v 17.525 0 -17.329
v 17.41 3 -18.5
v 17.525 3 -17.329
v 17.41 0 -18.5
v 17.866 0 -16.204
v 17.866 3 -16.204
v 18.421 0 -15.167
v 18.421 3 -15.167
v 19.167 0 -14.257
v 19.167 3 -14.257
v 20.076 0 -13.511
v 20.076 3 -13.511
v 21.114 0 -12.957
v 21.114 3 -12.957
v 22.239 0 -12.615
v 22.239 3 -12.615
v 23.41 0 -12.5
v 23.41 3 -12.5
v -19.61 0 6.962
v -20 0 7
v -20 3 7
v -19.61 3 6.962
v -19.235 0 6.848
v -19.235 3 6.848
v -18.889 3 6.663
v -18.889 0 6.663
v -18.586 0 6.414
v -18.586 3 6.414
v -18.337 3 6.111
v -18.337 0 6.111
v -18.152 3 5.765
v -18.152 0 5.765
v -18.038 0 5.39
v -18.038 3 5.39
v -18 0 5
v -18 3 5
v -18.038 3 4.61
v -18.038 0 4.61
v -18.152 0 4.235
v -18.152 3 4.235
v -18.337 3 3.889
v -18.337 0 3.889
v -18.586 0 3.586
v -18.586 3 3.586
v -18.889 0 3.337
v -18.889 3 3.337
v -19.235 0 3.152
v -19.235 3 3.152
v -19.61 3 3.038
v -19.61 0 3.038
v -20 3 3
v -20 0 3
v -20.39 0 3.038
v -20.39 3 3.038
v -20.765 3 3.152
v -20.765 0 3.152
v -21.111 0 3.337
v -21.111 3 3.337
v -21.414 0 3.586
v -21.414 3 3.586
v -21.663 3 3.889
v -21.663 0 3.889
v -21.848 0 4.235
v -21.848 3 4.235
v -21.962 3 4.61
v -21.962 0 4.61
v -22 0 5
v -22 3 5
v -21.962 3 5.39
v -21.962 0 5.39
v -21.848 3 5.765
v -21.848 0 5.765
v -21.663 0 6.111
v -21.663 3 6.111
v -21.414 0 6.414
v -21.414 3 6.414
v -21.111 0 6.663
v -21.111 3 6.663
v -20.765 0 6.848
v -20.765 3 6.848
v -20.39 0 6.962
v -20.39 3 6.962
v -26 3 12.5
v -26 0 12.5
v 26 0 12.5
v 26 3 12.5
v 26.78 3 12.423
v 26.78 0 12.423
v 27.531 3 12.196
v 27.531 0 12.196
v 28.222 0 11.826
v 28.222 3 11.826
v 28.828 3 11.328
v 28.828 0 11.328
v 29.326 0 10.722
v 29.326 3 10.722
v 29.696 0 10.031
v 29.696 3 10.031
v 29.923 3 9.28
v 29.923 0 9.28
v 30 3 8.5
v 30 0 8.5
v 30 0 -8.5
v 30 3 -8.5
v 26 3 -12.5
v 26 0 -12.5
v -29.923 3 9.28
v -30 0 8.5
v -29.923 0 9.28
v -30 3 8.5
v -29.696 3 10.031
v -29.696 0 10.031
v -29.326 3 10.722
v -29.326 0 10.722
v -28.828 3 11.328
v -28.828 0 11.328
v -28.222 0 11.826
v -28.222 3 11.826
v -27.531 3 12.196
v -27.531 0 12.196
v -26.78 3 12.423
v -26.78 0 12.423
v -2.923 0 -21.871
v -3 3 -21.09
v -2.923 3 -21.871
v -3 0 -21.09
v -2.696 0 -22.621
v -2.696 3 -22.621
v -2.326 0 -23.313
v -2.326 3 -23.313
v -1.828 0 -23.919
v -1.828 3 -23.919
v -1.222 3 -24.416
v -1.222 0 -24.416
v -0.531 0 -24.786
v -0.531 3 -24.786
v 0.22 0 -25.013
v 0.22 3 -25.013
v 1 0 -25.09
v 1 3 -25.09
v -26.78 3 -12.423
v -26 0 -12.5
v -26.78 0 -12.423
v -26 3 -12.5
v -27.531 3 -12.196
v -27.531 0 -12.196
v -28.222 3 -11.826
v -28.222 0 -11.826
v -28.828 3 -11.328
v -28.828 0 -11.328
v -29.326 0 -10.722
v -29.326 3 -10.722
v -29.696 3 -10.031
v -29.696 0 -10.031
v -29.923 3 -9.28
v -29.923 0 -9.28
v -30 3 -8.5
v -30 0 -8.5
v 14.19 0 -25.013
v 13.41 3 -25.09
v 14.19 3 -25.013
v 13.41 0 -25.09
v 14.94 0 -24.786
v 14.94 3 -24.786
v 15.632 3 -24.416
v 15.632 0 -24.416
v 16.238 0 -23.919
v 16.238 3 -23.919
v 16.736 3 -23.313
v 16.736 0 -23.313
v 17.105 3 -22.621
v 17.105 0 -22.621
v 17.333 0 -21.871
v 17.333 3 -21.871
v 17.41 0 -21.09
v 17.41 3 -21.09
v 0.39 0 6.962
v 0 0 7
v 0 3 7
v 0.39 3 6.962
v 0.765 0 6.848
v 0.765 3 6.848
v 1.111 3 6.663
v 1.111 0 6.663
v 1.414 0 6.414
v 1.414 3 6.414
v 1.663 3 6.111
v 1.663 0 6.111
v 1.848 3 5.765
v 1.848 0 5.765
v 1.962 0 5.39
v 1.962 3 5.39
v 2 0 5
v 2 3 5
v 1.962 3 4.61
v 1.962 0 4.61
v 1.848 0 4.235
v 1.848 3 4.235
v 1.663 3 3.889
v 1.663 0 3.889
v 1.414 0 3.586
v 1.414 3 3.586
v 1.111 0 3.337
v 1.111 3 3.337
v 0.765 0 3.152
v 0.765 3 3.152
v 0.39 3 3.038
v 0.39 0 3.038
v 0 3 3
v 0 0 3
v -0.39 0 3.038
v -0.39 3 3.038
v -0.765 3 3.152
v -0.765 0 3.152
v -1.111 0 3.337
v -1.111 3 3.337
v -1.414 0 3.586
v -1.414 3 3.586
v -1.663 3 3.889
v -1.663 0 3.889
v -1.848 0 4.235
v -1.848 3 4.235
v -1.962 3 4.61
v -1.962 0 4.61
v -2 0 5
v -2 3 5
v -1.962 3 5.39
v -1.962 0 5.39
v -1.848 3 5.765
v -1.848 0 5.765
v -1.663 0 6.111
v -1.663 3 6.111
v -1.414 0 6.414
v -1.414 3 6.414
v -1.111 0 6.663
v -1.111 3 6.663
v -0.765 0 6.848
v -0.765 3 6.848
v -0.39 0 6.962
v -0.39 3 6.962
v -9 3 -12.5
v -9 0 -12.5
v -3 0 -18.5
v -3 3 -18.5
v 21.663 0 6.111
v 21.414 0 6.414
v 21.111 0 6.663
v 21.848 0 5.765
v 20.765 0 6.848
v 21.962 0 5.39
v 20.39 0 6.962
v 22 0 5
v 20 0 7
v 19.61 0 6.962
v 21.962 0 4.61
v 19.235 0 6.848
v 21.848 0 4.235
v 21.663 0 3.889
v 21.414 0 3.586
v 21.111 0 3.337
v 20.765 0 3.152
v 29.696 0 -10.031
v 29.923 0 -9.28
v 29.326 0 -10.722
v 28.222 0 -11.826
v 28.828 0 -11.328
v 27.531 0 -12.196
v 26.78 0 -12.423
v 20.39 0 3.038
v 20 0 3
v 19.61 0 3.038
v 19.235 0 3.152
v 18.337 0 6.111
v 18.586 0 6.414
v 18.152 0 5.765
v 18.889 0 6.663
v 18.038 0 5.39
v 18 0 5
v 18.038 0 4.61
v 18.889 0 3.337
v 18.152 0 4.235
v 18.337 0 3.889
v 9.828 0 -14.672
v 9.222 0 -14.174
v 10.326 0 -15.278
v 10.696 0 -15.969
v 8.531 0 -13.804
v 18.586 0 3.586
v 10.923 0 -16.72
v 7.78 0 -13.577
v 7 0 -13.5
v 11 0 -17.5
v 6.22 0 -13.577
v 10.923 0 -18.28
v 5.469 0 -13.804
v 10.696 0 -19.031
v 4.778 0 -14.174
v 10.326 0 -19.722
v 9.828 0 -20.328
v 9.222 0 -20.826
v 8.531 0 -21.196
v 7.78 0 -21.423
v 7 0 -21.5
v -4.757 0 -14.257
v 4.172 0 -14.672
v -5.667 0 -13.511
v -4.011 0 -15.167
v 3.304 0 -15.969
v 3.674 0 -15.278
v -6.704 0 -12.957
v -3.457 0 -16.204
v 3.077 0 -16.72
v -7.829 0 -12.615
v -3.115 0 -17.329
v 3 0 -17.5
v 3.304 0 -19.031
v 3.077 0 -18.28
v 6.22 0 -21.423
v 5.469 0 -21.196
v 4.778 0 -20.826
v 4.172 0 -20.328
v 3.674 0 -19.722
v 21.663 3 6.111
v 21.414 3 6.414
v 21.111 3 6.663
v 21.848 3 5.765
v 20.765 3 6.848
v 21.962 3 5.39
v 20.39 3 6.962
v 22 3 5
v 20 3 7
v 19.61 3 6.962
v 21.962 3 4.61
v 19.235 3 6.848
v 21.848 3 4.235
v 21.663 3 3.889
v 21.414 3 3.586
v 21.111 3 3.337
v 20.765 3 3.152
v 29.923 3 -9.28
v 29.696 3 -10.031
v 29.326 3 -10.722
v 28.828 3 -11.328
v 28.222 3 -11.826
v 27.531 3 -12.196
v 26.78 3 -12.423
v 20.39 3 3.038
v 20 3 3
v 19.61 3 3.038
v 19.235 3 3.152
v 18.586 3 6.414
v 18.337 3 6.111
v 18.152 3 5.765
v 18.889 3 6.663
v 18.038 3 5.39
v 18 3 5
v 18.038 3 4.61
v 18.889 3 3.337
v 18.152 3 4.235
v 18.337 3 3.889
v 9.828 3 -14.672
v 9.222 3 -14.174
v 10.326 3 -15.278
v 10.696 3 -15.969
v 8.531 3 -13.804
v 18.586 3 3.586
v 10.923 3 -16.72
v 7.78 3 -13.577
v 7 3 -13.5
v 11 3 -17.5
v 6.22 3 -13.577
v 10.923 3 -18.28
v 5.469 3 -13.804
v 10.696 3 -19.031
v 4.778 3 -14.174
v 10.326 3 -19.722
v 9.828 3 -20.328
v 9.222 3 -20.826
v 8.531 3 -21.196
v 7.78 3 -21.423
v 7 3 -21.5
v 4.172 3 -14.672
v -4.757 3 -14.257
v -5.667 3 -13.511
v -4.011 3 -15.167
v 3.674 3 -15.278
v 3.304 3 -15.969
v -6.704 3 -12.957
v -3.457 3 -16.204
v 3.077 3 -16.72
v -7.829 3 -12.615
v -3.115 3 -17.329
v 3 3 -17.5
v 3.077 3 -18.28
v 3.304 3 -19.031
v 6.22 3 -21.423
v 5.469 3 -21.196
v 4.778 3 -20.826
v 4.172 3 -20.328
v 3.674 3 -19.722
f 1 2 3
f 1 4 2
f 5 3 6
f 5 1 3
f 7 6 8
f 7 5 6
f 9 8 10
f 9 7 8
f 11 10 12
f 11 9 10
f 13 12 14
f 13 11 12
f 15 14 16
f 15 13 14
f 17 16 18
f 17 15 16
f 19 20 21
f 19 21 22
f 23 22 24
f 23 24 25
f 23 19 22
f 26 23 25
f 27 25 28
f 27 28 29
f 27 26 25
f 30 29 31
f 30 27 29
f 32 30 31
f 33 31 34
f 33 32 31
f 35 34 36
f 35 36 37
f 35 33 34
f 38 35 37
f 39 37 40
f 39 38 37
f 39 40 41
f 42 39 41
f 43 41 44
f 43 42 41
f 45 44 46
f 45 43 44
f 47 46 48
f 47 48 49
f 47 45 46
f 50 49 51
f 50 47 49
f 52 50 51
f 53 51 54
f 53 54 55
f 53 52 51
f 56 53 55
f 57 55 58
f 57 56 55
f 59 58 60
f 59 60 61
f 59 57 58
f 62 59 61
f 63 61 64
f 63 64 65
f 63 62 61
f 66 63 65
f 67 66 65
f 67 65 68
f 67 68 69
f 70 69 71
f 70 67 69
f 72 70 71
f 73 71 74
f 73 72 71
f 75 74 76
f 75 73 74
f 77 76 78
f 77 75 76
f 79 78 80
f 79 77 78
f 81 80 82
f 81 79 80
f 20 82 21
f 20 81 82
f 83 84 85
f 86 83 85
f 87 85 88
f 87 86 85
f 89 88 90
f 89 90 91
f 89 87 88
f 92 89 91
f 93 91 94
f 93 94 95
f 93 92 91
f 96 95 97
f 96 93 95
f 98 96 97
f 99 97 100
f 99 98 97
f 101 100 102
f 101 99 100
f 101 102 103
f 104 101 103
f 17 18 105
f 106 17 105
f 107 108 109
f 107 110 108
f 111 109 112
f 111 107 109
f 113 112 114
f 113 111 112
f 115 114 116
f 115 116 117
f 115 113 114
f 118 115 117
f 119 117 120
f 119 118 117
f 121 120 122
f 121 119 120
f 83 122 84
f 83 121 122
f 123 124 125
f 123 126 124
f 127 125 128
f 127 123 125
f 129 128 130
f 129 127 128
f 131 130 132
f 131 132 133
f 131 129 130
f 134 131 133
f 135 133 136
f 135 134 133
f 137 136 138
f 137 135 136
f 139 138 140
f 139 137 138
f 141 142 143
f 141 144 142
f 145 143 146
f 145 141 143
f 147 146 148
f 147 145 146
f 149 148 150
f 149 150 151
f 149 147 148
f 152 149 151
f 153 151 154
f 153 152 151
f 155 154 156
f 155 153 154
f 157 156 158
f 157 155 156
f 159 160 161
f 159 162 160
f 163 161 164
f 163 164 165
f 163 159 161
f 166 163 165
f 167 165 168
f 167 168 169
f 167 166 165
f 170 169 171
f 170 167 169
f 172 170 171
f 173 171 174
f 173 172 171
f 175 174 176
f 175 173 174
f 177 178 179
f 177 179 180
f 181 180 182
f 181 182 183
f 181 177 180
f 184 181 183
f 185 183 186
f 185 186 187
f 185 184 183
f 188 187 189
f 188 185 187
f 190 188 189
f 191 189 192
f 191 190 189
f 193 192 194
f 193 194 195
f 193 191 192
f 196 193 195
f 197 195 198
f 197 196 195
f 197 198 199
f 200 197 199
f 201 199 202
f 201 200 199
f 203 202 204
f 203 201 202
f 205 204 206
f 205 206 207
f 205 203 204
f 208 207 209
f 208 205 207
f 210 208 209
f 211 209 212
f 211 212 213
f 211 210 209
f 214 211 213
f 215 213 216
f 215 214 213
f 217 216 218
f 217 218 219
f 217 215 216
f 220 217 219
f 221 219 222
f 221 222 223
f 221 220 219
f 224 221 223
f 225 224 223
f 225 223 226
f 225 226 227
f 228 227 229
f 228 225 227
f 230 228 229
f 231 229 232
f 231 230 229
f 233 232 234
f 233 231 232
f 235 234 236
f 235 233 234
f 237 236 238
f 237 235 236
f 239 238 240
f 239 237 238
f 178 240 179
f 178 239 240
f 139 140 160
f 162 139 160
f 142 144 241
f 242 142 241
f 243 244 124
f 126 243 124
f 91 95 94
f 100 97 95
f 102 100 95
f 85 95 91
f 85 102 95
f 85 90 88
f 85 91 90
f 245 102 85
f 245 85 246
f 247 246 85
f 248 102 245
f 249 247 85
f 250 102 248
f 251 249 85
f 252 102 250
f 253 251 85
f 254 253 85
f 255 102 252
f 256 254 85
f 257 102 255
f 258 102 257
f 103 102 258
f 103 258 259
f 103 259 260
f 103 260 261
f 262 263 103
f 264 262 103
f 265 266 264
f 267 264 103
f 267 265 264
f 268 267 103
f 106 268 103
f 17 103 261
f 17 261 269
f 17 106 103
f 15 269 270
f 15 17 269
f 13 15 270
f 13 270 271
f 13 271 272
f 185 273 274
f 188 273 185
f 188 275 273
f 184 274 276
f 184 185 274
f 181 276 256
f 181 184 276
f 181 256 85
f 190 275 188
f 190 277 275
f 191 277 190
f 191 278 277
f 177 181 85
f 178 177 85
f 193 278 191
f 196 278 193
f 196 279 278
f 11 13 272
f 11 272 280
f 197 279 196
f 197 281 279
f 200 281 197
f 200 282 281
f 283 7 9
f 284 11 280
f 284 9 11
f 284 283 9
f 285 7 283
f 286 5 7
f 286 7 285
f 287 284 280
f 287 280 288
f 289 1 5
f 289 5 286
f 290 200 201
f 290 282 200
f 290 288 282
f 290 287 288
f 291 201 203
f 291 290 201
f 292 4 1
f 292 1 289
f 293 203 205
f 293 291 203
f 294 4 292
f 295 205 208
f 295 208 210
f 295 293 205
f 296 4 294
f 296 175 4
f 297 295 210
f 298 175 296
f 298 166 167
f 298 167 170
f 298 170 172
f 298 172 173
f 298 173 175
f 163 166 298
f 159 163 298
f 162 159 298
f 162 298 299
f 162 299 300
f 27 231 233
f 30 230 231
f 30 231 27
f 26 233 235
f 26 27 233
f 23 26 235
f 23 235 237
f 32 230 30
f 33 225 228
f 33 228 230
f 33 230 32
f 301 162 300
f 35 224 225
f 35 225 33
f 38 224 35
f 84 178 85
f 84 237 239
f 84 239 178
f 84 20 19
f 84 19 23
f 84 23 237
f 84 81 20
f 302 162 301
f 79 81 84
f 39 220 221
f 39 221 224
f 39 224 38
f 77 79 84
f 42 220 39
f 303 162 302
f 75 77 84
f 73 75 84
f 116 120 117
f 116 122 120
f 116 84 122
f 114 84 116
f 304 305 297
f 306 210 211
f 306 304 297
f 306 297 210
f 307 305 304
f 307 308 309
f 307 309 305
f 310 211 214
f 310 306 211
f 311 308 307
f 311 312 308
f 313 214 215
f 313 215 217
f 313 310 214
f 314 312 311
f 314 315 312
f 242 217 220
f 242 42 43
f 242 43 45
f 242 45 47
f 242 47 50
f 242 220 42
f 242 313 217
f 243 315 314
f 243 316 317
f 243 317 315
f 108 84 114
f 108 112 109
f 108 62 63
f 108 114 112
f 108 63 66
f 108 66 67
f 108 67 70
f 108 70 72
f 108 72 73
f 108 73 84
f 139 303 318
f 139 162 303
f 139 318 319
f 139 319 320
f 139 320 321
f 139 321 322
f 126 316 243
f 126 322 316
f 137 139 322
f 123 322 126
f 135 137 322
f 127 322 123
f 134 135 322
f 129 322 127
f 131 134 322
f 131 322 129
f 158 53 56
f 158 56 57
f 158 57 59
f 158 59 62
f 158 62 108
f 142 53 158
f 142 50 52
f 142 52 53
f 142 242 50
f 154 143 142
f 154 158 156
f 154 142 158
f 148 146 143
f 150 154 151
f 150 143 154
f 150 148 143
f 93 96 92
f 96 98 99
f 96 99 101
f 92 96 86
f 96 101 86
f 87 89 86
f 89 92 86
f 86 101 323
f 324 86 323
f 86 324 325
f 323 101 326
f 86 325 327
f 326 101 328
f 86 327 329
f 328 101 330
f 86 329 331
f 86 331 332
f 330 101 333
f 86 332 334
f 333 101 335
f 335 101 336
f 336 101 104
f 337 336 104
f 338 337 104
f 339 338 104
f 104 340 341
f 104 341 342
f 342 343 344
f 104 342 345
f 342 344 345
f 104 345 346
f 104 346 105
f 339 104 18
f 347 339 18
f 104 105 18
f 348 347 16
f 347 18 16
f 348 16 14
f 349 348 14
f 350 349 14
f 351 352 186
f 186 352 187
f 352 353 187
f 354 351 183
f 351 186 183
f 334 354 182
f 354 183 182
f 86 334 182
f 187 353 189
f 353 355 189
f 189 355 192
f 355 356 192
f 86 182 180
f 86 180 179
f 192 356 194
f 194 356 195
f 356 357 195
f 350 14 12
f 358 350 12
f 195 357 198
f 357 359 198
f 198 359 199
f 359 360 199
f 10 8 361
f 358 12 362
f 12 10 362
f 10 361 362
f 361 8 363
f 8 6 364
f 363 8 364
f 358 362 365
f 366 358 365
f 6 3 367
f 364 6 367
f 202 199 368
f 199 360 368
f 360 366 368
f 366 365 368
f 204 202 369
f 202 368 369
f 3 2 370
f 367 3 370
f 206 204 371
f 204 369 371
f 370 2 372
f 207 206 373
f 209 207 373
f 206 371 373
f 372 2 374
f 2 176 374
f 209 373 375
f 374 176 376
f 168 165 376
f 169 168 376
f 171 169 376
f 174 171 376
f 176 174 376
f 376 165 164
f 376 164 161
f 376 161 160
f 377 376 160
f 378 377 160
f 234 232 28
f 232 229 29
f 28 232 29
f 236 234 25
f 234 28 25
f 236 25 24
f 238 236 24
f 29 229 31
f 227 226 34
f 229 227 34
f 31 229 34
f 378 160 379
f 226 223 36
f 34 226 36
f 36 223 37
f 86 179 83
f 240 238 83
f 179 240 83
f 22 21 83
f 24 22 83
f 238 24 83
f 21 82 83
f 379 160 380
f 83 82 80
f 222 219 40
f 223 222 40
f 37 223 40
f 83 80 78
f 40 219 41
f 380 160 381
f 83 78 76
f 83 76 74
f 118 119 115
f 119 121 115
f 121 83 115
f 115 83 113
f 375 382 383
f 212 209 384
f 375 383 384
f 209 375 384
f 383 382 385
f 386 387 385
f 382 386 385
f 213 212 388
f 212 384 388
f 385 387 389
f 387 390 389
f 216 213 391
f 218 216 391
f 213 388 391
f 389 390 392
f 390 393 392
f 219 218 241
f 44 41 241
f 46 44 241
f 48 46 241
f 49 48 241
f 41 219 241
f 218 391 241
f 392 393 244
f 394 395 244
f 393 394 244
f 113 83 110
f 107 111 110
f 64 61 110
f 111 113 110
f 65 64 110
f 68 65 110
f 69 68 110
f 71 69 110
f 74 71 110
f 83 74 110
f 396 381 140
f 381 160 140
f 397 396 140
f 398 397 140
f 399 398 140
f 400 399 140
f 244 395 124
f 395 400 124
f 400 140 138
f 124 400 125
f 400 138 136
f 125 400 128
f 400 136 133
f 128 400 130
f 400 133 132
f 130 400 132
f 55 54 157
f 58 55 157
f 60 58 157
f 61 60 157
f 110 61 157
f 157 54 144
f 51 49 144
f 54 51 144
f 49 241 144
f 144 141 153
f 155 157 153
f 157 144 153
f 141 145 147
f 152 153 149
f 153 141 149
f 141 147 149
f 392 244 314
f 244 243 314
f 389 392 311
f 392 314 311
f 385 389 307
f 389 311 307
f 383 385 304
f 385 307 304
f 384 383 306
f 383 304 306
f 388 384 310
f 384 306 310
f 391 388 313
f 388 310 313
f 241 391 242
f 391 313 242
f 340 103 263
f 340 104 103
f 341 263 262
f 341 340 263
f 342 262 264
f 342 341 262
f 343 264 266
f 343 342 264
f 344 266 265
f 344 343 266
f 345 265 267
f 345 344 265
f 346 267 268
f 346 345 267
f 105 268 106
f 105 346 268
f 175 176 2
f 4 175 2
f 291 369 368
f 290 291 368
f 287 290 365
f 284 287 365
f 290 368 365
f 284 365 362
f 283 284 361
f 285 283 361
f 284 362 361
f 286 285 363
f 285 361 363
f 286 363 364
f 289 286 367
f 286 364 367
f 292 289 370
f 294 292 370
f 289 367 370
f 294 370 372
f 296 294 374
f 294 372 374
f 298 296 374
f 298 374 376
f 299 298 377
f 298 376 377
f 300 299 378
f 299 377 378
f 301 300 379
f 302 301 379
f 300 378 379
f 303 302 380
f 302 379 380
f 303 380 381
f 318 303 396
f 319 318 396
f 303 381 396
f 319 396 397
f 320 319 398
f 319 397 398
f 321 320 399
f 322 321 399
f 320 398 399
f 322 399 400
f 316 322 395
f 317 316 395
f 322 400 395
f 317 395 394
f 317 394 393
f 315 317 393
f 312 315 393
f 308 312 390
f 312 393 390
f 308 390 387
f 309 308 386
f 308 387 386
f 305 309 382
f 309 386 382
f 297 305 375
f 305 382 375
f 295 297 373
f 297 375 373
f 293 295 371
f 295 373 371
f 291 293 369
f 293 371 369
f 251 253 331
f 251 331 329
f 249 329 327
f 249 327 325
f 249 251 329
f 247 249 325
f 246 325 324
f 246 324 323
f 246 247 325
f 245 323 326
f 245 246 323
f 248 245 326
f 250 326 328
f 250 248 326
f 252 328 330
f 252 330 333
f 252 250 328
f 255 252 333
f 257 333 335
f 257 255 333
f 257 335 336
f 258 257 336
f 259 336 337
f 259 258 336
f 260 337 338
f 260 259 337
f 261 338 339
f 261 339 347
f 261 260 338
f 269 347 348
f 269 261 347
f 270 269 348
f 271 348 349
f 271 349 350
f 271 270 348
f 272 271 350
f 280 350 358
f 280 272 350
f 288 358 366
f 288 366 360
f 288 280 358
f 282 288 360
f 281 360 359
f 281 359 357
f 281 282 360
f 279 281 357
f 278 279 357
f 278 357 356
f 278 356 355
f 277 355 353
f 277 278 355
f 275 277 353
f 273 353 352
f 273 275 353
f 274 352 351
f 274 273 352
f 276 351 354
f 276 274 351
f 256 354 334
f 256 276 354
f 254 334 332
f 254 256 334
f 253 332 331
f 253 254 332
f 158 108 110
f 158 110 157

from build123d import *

# Parameters (mm, degrees)
SKETCH_1_W          = 60
SKETCH_1_H          = 25
SKETCH_1_R          = 2
EXTRUDE_1_DEPTH     = 3
SKETCH_2_R          = 4
CUT_EXTRUDE_1_DEPTH = 3
CUT_EXTRUDE_2_DEPTH = 10
FILLET_1_R          = 6
FILLET_2_R          = 4
FILLET_3_R          = 4


with BuildPart() as part:
    # 草图1 → 凸台-拉伸1 (new body)
    # profile 1 of 2: a face of its own
    with BuildSketch(Plane(origin=(0, 0, 0), x_dir=(1, 0, 0), z_dir=(0, 1, 0))):
        Rectangle(SKETCH_1_W, SKETCH_1_H)
        with Locations(Location((20, -5, 0), (0, 0, 270))):
            Circle(SKETCH_1_R, mode=Mode.SUBTRACT)
        with Locations(Location((-20, -5, 0), (0, 0, 270))):
            Circle(SKETCH_1_R, mode=Mode.SUBTRACT)
        with Locations(Location((0, -5, 0), (0, 0, 270))):
            Circle(SKETCH_1_R, mode=Mode.SUBTRACT)
    # profile 2 of 2: a face of its own
    with BuildSketch(Plane(origin=(0, 0, 0), x_dir=(1, 0, 0), z_dir=(0, 1, 0))):
        Polygon((10.919107028, 31.580892972), (30, 12.5), (-30, 12.5), align=None)
    extrude(amount=EXTRUDE_1_DEPTH)

    # 草图2 → 切除-拉伸1 (cut)
    with BuildSketch(Plane(origin=(0, 3, 0), x_dir=(1, 0, 0), z_dir=(0, 1, 0))):
        with Locations(Location((7, 17.5, 0), (0, 0, 270))):
            Circle(SKETCH_2_R)
    extrude(amount=-CUT_EXTRUDE_1_DEPTH, mode=Mode.SUBTRACT)

    # 草图3 → 切除-拉伸2 (cut)
    with BuildSketch(Plane(origin=(0, 3, 0), x_dir=(1, 0, 0), z_dir=(0, 1, 0))):
        Polygon((-3, 25.09030677), (-30, 12.5), (-3, 12.5), align=None)
        Polygon((10.919107028, 31.580892972), (-3, 25.09030677), (17.40969323, 25.09030677), align=None)
        Polygon((30, 12.5), (17.40969323, 25.09030677), (17.40969323, 12.5), align=None)
    extrude(amount=-CUT_EXTRUDE_2_DEPTH, mode=Mode.SUBTRACT)

    # 圆角1
    fillet_1_edges = [part.edges().sort_by_distance(p)[0] for p in [
        (-3, 1.5, -12.5),
        (17.40969323, 1.5, -12.5),
    ]]
    fillet(fillet_1_edges, radius=FILLET_1_R)

    # 圆角2
    fillet_2_edges = [part.edges().sort_by_distance(p)[0] for p in [
        (-3, 1.5, -25.09030677),
        (17.40969323, 1.5, -25.09030677),
    ]]
    fillet(fillet_2_edges, radius=FILLET_2_R)

    # 圆角3
    fillet_3_edges = [part.edges().sort_by_distance(p)[0] for p in [
        (30, 1.5, 12.5),
        (-30, 1.5, 12.5),
        (-30, 1.5, -12.5),
        (30, 1.5, -12.5),
    ]]
    fillet(fillet_3_edges, radius=FILLET_3_R)


solid = part.part
